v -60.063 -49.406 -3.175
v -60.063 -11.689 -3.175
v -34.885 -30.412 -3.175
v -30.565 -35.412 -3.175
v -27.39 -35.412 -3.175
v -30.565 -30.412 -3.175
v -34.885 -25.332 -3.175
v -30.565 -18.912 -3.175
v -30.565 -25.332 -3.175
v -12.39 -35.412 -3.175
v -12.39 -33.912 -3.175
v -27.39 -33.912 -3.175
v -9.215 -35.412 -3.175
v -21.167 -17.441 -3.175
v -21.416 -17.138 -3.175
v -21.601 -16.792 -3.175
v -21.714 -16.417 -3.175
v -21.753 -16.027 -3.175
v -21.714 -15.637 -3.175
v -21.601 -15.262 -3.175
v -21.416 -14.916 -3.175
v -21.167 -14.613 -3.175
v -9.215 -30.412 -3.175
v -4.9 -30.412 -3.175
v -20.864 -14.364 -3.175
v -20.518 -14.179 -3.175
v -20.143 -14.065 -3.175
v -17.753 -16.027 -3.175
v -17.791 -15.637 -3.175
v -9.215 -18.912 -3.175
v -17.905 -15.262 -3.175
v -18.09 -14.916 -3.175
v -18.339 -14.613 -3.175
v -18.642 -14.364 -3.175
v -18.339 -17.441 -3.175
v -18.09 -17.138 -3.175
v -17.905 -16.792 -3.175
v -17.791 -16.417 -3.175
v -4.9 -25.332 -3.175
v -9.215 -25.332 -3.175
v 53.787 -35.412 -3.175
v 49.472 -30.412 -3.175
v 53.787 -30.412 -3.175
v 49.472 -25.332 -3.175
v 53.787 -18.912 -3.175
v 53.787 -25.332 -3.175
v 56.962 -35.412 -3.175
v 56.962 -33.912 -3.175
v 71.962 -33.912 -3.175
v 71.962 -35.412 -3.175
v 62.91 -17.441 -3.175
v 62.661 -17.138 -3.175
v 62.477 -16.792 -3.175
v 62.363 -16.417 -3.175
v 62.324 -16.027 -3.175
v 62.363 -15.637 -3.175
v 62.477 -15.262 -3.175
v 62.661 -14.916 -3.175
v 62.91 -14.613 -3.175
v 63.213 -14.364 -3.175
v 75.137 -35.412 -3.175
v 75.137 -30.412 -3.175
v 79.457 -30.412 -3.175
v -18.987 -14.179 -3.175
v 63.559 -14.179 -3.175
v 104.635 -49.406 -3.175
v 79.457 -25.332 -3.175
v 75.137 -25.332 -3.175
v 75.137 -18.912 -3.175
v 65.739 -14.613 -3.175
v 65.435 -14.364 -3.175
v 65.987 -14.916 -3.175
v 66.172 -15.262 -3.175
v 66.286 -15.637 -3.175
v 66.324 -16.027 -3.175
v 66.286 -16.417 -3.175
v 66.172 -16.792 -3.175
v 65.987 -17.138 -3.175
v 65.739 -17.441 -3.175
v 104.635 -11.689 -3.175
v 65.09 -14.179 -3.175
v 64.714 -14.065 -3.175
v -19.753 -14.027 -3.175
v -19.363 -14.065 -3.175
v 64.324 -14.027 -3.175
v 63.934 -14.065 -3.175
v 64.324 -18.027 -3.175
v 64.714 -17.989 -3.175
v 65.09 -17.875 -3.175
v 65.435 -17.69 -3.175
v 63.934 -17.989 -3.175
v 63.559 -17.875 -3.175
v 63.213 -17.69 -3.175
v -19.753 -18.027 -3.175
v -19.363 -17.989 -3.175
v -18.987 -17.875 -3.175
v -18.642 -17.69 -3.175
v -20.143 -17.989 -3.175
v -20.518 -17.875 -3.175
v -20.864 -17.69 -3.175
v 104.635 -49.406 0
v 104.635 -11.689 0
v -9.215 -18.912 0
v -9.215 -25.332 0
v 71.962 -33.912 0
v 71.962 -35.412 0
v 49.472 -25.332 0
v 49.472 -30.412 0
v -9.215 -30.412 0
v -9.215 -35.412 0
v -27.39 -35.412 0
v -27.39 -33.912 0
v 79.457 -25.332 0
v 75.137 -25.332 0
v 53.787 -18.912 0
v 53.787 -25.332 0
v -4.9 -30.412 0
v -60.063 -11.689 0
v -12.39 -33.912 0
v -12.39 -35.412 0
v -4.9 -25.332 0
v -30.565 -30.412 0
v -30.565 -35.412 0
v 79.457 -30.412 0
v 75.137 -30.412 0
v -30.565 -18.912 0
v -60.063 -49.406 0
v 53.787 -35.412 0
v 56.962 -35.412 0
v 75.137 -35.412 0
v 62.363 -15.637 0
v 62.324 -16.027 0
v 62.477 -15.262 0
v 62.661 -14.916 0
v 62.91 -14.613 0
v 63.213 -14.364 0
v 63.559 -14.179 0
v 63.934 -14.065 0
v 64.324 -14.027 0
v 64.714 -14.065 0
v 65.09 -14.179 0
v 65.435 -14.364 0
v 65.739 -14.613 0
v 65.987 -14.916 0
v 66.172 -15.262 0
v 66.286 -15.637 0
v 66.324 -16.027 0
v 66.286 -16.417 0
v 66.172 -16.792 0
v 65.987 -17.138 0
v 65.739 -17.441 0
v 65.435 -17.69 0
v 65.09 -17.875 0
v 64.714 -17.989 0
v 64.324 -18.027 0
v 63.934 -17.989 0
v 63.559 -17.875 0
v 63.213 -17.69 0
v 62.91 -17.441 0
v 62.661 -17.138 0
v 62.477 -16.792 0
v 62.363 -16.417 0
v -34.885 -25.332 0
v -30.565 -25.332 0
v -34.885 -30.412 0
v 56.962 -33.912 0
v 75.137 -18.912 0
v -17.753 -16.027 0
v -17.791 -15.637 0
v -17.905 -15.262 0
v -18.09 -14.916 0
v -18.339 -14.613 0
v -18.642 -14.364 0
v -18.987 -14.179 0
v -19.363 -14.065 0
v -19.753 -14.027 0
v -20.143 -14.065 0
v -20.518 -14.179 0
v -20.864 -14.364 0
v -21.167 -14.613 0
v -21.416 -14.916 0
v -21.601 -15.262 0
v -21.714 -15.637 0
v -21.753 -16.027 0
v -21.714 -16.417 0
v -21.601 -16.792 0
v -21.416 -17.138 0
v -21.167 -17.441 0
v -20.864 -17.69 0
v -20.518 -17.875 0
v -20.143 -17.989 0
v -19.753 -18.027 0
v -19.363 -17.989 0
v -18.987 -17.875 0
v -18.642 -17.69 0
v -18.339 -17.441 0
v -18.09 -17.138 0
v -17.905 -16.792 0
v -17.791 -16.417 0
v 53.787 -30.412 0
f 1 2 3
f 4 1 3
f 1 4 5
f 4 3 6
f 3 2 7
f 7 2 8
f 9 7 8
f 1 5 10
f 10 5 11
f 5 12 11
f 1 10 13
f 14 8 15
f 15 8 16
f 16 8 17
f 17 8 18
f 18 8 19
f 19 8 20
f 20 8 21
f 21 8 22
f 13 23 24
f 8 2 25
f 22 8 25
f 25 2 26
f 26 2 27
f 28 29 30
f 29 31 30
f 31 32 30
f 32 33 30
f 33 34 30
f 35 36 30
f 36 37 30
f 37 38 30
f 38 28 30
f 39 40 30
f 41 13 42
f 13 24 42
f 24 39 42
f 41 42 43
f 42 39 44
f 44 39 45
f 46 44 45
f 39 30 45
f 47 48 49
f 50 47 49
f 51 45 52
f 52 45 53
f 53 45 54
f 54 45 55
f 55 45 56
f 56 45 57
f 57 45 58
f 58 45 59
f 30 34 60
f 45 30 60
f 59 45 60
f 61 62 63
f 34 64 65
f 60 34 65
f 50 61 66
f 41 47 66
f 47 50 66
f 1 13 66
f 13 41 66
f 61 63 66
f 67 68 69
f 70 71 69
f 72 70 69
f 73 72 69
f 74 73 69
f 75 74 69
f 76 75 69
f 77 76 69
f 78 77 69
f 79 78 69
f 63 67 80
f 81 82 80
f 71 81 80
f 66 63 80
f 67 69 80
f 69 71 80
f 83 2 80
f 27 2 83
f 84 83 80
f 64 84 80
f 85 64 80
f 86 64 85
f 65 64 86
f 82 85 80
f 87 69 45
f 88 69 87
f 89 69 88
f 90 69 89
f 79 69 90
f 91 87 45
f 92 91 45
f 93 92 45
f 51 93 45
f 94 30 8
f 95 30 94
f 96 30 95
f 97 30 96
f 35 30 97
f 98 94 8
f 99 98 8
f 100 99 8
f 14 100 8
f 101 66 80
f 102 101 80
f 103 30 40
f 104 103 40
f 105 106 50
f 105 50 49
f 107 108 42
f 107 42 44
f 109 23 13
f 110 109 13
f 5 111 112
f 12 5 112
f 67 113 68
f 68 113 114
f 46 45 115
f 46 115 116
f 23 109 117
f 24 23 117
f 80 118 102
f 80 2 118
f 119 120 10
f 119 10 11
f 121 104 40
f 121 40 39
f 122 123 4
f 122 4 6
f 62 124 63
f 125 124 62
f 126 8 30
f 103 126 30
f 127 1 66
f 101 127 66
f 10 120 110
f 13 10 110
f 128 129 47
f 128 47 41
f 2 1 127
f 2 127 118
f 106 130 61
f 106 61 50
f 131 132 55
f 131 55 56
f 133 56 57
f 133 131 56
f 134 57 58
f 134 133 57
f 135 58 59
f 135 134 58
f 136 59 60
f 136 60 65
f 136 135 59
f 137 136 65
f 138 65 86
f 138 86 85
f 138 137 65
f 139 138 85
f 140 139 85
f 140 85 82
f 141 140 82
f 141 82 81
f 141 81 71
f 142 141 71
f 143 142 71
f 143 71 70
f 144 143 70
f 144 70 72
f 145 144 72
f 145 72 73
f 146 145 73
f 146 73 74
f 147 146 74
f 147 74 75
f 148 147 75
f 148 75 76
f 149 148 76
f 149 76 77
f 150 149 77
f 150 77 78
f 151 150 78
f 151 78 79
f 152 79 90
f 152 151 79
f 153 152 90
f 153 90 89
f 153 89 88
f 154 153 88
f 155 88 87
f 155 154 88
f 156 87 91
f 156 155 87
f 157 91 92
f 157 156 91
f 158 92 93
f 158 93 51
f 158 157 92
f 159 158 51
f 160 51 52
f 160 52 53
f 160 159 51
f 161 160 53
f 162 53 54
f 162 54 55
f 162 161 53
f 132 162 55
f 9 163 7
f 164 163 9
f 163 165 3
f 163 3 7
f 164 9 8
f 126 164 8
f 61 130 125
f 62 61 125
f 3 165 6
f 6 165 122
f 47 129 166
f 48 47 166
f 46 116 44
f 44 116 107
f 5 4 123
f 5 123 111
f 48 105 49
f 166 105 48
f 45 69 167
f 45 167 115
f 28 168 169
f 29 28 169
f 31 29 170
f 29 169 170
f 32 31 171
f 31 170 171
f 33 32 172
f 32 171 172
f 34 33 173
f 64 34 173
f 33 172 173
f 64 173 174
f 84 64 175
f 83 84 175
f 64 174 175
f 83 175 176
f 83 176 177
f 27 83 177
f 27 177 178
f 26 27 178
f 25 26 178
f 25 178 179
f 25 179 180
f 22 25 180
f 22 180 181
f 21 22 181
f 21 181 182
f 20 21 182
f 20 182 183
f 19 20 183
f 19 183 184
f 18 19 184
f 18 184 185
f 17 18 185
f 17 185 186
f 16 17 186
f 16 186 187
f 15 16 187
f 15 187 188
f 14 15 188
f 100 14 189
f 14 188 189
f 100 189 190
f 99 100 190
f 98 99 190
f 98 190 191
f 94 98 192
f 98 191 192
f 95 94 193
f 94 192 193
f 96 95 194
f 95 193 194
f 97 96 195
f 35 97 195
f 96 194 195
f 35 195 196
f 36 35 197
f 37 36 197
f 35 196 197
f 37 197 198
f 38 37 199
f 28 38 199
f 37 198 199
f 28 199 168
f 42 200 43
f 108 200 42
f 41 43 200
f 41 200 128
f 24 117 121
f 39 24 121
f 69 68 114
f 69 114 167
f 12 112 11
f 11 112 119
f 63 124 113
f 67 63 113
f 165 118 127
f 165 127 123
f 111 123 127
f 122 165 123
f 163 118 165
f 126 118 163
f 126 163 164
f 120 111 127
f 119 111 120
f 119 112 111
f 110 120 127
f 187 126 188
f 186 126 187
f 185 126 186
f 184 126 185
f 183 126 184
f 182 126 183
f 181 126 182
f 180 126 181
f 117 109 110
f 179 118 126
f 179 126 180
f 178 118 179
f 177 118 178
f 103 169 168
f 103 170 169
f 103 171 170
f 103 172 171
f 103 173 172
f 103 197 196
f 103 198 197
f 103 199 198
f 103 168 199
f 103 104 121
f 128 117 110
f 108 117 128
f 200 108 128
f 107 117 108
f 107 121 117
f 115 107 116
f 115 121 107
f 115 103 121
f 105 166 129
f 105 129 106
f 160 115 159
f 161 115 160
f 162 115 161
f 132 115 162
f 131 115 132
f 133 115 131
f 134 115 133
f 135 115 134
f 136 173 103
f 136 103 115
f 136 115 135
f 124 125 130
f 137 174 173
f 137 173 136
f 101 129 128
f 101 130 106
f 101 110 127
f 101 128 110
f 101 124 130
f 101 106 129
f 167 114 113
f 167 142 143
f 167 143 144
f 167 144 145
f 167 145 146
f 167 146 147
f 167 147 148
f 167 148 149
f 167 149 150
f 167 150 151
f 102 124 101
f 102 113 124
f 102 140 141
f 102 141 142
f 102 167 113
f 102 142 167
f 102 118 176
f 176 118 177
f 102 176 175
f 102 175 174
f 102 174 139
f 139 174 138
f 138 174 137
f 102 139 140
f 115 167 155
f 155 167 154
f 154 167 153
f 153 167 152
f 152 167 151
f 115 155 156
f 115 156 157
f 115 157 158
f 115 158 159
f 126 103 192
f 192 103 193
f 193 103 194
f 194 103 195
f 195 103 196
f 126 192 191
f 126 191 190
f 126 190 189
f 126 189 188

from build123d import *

# Parameters (mm, degrees)
BOSS_EXTRUDE1_DEPTH               = 3.175
SKETCH8_W                         = 36.346
SKETCH8_H                         = 3.175
BOSS_EXTRUDE3_DEPTH               = 3.175
SKETCH7_R                         = 2
LED_HOLE_DEPTH                    = 4.175
SKETCH10_W                        = 36.346
SKETCH10_H                        = 12.319
LOWER_PART_DEPTH                  = 3.175
CUT_EXTRUDE3_DEPTH                = 4.175
SKETCH11_W                        = 4.32
SKETCH11_H                        = 5.08
SKETCH11_W_2                      = 4.315
IR_HOLE_DEPTH                     = 4.175
SKETCH14_W                        = 24.003
SKETCH14_H                        = 37.717280076
SKETCH14_W_2                      = 22
BOSS_EXTRUDE5_DEPTH               = 3.175
SKETCH19_W                        = 3.175
SKETCH19_H                        = 1.5
BOTTOM_GROOVE_FOR_SIDE_PART_DEPTH = 3.175


with BuildPart() as part:
    # Sketch1 → Boss-Extrude1 (new body)
    with BuildSketch(Plane.XY):
        Polygon((-27.39024803, -18.912140652), (-12.39024803, -18.912140652), (-12.39024803, -33.912140652), (-1.71724803, -33.912140652), (-1.71724803, -14.863860576), (-38.06324803, -14.863860576), (-38.06324803, -33.912140652), (-27.39024803, -33.912140652), align=None)
    extrude(amount=-BOSS_EXTRUDE1_DEPTH)

    # Sketch8 → Boss-Extrude3 (add)
    with BuildSketch(Plane.XY):
        with Locations((-19.89024803, -35.499640652)):
            Rectangle(SKETCH8_W, SKETCH8_H)
        with Locations((-19.89024803, -13.276360576)):
            Rectangle(SKETCH8_W, SKETCH8_H)
    extrude(amount=-BOSS_EXTRUDE3_DEPTH)

    # Sketch7 → LED hole (cut, through all)
    with BuildSketch(Plane.XY):
        with Locations((-19.752796976, -16.027063068)):
            Circle(SKETCH7_R)
    extrude(amount=-LED_HOLE_DEPTH, mode=Mode.SUBTRACT)

    # Sketch10 → Lower part (add)
    with BuildSketch(Plane.XY):
        with Locations((-19.89024803, -43.246640652)):
            Rectangle(SKETCH10_W, SKETCH10_H)
    extrude(amount=-LOWER_PART_DEPTH)

    # Sketch12 → Cut-Extrude3 (cut, through all)
    with BuildSketch(Plane(origin=(0, 0, -3.175), x_dir=(-1, 0, 0), z_dir=(0, 0, -1))):
        Polygon((12.39024803, -33.912140652), (12.39024803, -18.912140652), (9.21524803, -18.912140652), (9.21524803, -22.092140652), (9.21524803, -30.737140652), (9.21524803, -33.912140652), align=None)
        Polygon((27.39024803, -18.912140652), (27.39024803, -33.912140652), (30.56524803, -33.912140652), (30.56524803, -30.732140652), (30.56524803, -22.087140652), (30.56524803, -18.912140652), align=None)
    extrude(amount=-CUT_EXTRUDE3_DEPTH, mode=Mode.SUBTRACT)

    # Sketch11 → IR Hole (cut, through all)
    with BuildSketch(Plane.XY):
        with Locations((-32.72524803, -27.872140652)):
            Rectangle(SKETCH11_W, SKETCH11_H)
        with Locations((-7.057813242, -27.872140652)):
            Rectangle(SKETCH11_W_2, SKETCH11_H)
    extrude(amount=-IR_HOLE_DEPTH, mode=Mode.SUBTRACT)

    # Sketch14 → Boss-Extrude5 (add)
    with BuildSketch(Plane(origin=(0, 0, -3.175), x_dir=(-1, 0, 0), z_dir=(0, 0, -1))):
        with Locations((-10.28425197, -30.547500614)):
            Rectangle(SKETCH14_W, SKETCH14_H)
        with Locations((49.06324803, -30.547500614)):
            Rectangle(SKETCH14_W_2, SKETCH14_H)
    extrude(amount=-BOSS_EXTRUDE5_DEPTH)

    # Sketch19 → bottom groove for side part (cut)
    with BuildSketch(Plane.XY):
        with Locations((-28.97774803, -34.662140652)):
            Rectangle(SKETCH19_W, SKETCH19_H)
        with Locations((-10.80274803, -34.662140652)):
            Rectangle(SKETCH19_W, SKETCH19_H)
    extrude(amount=-BOTTOM_GROOVE_FOR_SIDE_PART_DEPTH, mode=Mode.SUBTRACT)

    # Mirror1: part across plane


with BuildPart() as part_1:
    add(part.part)
    add(part.part.mirror(Plane(origin=(22.28575197, 0, 0), x_dir=(0, 0, 1), z_dir=(1, 0, 0))))


solid = part_1.part
